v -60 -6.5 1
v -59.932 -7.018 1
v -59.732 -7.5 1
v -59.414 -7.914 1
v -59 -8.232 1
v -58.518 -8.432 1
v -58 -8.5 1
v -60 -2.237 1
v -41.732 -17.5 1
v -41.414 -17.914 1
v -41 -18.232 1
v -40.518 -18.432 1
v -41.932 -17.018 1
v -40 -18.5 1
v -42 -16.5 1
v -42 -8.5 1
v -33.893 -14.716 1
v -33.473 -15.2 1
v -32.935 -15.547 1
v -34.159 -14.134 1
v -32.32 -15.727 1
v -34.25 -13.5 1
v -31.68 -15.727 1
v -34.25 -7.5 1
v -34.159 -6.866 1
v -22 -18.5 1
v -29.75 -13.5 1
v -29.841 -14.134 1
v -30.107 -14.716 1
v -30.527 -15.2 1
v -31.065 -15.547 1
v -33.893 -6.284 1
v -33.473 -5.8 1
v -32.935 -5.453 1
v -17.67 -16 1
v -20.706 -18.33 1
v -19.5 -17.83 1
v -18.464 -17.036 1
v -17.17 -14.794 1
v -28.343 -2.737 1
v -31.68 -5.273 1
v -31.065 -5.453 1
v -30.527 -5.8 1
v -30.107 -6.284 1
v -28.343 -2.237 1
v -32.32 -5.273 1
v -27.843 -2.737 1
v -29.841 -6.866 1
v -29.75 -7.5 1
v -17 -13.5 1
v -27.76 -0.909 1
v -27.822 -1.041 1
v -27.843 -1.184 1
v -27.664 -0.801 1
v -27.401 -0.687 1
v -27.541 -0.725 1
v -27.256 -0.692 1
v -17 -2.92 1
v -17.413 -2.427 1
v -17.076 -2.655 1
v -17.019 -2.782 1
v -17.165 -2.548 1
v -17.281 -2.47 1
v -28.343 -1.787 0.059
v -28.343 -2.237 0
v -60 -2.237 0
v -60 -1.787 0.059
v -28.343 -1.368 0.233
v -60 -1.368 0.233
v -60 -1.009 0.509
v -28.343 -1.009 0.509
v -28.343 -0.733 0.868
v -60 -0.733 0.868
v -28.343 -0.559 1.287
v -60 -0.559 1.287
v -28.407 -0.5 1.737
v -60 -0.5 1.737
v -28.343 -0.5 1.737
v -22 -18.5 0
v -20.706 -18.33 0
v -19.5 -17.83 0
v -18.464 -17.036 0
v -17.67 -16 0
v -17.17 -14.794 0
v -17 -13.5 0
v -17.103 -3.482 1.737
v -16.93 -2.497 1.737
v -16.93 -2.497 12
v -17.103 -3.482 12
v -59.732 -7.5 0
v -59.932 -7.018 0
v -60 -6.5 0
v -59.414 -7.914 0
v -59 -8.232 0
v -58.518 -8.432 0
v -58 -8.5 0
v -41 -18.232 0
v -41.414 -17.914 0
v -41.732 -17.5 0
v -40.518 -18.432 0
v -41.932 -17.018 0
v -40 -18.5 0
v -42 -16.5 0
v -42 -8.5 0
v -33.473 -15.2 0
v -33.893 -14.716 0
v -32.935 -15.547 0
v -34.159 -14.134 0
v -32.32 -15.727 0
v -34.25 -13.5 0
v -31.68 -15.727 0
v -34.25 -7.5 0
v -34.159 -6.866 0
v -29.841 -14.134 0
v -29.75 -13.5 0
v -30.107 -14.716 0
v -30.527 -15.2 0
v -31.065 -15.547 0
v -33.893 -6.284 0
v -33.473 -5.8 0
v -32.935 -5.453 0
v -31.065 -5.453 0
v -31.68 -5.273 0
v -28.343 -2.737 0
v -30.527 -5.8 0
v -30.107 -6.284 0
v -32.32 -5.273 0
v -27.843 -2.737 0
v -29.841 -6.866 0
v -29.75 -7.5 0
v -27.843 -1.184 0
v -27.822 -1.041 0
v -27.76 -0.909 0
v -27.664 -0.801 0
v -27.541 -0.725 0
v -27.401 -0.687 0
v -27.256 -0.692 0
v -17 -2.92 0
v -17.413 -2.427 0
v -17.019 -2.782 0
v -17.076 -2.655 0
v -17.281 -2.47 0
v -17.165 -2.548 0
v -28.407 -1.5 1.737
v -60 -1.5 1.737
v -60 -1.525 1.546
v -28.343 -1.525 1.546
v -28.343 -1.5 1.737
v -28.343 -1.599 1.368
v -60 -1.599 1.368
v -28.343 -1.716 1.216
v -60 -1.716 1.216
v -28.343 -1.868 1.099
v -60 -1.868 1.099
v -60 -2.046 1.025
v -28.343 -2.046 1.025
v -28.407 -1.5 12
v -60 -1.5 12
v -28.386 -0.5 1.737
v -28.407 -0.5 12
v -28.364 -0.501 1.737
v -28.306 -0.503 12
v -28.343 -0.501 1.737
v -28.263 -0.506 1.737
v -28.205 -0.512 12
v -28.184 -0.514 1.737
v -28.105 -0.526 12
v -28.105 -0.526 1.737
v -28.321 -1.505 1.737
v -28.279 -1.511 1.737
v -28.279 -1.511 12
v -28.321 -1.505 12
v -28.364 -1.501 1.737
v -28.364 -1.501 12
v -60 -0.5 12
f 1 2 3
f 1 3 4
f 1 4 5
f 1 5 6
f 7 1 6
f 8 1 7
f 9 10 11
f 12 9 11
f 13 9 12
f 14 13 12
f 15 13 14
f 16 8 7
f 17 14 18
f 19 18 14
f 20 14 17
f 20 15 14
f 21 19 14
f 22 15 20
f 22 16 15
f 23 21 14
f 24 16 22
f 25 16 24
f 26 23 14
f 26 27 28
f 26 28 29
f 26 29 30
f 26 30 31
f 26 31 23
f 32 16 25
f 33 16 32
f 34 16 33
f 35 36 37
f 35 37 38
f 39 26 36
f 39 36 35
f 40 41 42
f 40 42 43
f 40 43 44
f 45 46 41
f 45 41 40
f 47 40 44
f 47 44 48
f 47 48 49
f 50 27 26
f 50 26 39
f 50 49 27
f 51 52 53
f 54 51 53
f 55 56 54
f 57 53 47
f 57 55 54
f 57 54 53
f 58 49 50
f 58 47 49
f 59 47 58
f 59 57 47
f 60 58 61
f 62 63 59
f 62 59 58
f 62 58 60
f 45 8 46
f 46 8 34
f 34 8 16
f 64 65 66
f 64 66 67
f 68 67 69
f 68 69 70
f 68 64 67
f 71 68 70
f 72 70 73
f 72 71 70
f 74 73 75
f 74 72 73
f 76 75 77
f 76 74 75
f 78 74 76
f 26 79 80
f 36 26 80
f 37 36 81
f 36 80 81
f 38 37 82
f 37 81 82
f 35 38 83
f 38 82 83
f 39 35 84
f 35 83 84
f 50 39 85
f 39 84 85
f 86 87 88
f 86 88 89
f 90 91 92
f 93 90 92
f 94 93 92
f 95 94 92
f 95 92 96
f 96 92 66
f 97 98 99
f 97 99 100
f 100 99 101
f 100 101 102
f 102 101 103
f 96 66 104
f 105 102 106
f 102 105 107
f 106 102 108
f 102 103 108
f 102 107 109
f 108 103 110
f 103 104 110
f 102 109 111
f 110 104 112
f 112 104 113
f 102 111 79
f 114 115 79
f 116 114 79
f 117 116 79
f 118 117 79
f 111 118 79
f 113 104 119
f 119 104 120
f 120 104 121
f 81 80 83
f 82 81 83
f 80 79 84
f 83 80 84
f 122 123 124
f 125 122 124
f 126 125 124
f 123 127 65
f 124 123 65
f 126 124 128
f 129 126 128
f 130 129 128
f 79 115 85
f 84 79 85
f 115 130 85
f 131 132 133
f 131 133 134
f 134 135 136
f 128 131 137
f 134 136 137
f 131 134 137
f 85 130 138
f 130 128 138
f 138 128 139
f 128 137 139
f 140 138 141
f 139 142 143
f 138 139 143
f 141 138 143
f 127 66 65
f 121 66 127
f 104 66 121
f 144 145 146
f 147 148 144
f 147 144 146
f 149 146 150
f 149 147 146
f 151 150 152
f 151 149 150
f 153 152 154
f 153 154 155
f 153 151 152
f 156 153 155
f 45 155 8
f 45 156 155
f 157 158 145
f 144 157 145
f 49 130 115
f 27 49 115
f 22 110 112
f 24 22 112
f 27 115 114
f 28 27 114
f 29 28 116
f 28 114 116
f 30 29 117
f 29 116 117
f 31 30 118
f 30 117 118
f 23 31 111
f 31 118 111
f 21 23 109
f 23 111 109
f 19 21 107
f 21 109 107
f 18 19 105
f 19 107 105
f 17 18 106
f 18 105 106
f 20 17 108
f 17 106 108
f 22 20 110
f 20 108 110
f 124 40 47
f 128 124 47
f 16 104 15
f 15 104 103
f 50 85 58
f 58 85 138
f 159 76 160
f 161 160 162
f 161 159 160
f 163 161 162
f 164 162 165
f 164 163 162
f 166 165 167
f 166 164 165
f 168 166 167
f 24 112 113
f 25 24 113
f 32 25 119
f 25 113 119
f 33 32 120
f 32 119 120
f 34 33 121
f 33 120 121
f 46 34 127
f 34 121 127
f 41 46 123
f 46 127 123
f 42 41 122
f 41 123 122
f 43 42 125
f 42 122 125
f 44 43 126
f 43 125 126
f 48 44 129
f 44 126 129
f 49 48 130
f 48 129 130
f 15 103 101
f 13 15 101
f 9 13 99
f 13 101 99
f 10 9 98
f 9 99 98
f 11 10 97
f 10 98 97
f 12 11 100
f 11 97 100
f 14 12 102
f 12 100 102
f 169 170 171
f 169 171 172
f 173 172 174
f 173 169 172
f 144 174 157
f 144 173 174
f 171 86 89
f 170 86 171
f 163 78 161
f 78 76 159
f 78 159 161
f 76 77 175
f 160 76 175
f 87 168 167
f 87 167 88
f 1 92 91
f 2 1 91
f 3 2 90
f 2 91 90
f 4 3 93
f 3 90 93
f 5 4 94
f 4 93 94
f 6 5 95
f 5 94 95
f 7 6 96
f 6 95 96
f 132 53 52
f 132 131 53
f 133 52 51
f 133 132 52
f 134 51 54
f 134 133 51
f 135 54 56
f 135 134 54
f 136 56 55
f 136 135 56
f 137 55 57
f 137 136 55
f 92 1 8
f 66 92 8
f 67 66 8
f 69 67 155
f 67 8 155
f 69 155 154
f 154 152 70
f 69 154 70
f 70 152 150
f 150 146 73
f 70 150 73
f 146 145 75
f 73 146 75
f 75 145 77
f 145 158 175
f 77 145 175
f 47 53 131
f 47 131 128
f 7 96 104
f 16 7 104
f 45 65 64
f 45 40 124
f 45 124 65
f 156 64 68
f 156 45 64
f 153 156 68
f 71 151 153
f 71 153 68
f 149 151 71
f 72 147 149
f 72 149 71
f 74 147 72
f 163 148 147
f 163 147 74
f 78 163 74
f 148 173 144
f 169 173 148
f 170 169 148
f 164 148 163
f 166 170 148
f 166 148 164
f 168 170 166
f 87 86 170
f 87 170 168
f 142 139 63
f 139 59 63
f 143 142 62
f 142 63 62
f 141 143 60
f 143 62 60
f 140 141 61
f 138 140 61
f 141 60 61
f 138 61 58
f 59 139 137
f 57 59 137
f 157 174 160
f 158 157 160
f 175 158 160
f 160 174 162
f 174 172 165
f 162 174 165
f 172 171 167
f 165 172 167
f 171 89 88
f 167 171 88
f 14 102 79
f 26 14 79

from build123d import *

# Parameters (mm, degrees)
BASIS_BLECH1_DEPTH             = 1
KANTE_LASCHE1_STRIP_W          = 5.4732
KANTE_LASCHE1_STRIP_H          = 1
KANTE_LASCHE1_STRIP_CUT_DEPTH  = 31.657436361
KANTE_LASCHE1_RELIEF_W         = 5.9732
KANTE_LASCHE1_RELIEF_H         = 0.5
KANTE_LASCHE1_RELIEF_CUT_DEPTH = 1
KANTE_LASCHE1_DEPTH            = 31.657436361
KANTE_LASCHE2_STRIP_CUT_DEPTH  = 10.2634
KANTE_LASCHE2_DEPTH            = 10.2634
VERRUNDUNG1_R                  = 0.5


# Sheet-metal steps are written as plain solids
with BuildPart() as part:
    # Skizze1 → Basis-Blech1 (new body)
    with BuildSketch(Plane.XY):
        with BuildLine():
            Line((-42, -8.5), (-42, -16.5))
            ThreePointArc((-42, -16.5), (-41.414213562, -17.914213562), (-40, -18.5))
            Line((-40, -18.5), (-22, -18.5))
            ThreePointArc((-22, -18.5), (-18.464466094, -17.035533906), (-17, -13.5))
            Line((-17, -13.5), (-17, -2.5))
            Line((-17, -2.5), (-28.342563639, -0.5))
            Line((-28.342563639, -0.5), (-60, -0.5))
            Line((-60, -0.5), (-60, -6.5))
            ThreePointArc((-60, -6.5), (-59.414213562, -7.914213562), (-58, -8.5))
            Line((-58, -8.5), (-42, -8.5))
        make_face()
        with BuildLine():
            Line((-29.75, -7.5), (-29.75, -13.5))
            ThreePointArc((-29.75, -13.5), (-32, -15.75), (-34.25, -13.5))
            Line((-34.25, -13.5), (-34.25, -7.5))
            ThreePointArc((-34.25, -7.5), (-32, -5.25), (-29.75, -7.5))
        make_face(mode=Mode.SUBTRACT)
    extrude(amount=BASIS_BLECH1_DEPTH)

    # Kante-Lasche1 strip (across the edge) → Kante-Lasche1 strip cut (cut)
    with BuildSketch(Plane(origin=(-28.342563639, -0.5, 1), x_dir=(0, -1, 0), z_dir=(-1, 0, 0))):
        with Locations((-1, -0.5)):
            Rectangle(KANTE_LASCHE1_STRIP_W, KANTE_LASCHE1_STRIP_H)
    extrude(amount=KANTE_LASCHE1_STRIP_CUT_DEPTH, mode=Mode.SUBTRACT)

    # Kante-Lasche1 relief (on the sheet) → Kante-Lasche1 relief cut (cut)
    with BuildSketch(Plane(origin=(-28.342563639, -2.2366, 1), x_dir=(0, -1, 0), z_dir=(0, 0, 1))):
        with Locations((-2.4866, 0.25)):
            Rectangle(KANTE_LASCHE1_RELIEF_W, KANTE_LASCHE1_RELIEF_H)
    extrude(amount=-KANTE_LASCHE1_RELIEF_CUT_DEPTH, mode=Mode.SUBTRACT)

    # Kante-Lasche1 section (across the edge) → Kante-Lasche1 (add)
    with BuildSketch(Plane(origin=(-28.342563639, -0.5, 1), x_dir=(0, -1, 0), z_dir=(-1, 0, 0))):
        with BuildLine():
            Line((0, 0.7366), (0, 11))
            Line((0, 11), (1, 11))
            Line((1, 11), (1, 0.7366))
            ThreePointArc((1, 0.7366), (1.215745145, 0.215745145), (1.7366, 0))
            Line((1.7366, 0), (1.7366, -1))
            ThreePointArc((1.7366, -1), (0.508638364, -0.491361636), (0, 0.7366))
        make_face()
    extrude(amount=KANTE_LASCHE1_DEPTH)

    # Kante-Lasche2 strip (across the edge) → Kante-Lasche2 strip cut (cut)
    with BuildSketch(Plane(origin=(-28.342563639, -1.5, 1.7366), x_dir=(-0.1736481776669236, -0.9848077530122092, 3.3156835934820577e-15), z_dir=(0, 0, 1))):
        Polygon((-1.92402835, 5.152936518), (-0.973617144, -0.237113276), (0.011190609, -0.063465098), (-0.939220597, 5.326584696), align=None)
    extrude(amount=KANTE_LASCHE2_STRIP_CUT_DEPTH, mode=Mode.SUBTRACT)

    # Kante-Lasche2 section (across the edge) → Kante-Lasche2 (add)
    with BuildSketch(Plane(origin=(-28.342563639, -1.5, 1.7366), x_dir=(-0.1736481776669236, -0.9848077530122092, 3.3156835934820577e-15), z_dir=(0, 0, 1))):
        with BuildLine():
            Line((-1, 0.06444415), (-1, 11.412511336))
            Line((-1, 11.412511336), (0, 11.412511336))
            Line((0, 11.412511336), (0, 0.06444415))
            ThreePointArc((0, 0.06444415), (0.002802985, 0.000245229), (0.011190609, -0.063465098))
            Line((0.011190609, -0.063465098), (-0.973617144, -0.237113276))
            ThreePointArc((-0.973617144, -0.237113276), (-0.993391713, -0.086910513), (-1, 0.06444415))
        make_face()
    extrude(amount=KANTE_LASCHE2_DEPTH)

    # Verrundung1
    verrundung1_edges = [part.edges().sort_by_distance(p)[0] for p in [
        (-17, -2.5, 0.5),
        (-27.842563639, -0.58816349, 0.5),
    ]]
    fillet(verrundung1_edges, radius=VERRUNDUNG1_R)


solid = part.part
